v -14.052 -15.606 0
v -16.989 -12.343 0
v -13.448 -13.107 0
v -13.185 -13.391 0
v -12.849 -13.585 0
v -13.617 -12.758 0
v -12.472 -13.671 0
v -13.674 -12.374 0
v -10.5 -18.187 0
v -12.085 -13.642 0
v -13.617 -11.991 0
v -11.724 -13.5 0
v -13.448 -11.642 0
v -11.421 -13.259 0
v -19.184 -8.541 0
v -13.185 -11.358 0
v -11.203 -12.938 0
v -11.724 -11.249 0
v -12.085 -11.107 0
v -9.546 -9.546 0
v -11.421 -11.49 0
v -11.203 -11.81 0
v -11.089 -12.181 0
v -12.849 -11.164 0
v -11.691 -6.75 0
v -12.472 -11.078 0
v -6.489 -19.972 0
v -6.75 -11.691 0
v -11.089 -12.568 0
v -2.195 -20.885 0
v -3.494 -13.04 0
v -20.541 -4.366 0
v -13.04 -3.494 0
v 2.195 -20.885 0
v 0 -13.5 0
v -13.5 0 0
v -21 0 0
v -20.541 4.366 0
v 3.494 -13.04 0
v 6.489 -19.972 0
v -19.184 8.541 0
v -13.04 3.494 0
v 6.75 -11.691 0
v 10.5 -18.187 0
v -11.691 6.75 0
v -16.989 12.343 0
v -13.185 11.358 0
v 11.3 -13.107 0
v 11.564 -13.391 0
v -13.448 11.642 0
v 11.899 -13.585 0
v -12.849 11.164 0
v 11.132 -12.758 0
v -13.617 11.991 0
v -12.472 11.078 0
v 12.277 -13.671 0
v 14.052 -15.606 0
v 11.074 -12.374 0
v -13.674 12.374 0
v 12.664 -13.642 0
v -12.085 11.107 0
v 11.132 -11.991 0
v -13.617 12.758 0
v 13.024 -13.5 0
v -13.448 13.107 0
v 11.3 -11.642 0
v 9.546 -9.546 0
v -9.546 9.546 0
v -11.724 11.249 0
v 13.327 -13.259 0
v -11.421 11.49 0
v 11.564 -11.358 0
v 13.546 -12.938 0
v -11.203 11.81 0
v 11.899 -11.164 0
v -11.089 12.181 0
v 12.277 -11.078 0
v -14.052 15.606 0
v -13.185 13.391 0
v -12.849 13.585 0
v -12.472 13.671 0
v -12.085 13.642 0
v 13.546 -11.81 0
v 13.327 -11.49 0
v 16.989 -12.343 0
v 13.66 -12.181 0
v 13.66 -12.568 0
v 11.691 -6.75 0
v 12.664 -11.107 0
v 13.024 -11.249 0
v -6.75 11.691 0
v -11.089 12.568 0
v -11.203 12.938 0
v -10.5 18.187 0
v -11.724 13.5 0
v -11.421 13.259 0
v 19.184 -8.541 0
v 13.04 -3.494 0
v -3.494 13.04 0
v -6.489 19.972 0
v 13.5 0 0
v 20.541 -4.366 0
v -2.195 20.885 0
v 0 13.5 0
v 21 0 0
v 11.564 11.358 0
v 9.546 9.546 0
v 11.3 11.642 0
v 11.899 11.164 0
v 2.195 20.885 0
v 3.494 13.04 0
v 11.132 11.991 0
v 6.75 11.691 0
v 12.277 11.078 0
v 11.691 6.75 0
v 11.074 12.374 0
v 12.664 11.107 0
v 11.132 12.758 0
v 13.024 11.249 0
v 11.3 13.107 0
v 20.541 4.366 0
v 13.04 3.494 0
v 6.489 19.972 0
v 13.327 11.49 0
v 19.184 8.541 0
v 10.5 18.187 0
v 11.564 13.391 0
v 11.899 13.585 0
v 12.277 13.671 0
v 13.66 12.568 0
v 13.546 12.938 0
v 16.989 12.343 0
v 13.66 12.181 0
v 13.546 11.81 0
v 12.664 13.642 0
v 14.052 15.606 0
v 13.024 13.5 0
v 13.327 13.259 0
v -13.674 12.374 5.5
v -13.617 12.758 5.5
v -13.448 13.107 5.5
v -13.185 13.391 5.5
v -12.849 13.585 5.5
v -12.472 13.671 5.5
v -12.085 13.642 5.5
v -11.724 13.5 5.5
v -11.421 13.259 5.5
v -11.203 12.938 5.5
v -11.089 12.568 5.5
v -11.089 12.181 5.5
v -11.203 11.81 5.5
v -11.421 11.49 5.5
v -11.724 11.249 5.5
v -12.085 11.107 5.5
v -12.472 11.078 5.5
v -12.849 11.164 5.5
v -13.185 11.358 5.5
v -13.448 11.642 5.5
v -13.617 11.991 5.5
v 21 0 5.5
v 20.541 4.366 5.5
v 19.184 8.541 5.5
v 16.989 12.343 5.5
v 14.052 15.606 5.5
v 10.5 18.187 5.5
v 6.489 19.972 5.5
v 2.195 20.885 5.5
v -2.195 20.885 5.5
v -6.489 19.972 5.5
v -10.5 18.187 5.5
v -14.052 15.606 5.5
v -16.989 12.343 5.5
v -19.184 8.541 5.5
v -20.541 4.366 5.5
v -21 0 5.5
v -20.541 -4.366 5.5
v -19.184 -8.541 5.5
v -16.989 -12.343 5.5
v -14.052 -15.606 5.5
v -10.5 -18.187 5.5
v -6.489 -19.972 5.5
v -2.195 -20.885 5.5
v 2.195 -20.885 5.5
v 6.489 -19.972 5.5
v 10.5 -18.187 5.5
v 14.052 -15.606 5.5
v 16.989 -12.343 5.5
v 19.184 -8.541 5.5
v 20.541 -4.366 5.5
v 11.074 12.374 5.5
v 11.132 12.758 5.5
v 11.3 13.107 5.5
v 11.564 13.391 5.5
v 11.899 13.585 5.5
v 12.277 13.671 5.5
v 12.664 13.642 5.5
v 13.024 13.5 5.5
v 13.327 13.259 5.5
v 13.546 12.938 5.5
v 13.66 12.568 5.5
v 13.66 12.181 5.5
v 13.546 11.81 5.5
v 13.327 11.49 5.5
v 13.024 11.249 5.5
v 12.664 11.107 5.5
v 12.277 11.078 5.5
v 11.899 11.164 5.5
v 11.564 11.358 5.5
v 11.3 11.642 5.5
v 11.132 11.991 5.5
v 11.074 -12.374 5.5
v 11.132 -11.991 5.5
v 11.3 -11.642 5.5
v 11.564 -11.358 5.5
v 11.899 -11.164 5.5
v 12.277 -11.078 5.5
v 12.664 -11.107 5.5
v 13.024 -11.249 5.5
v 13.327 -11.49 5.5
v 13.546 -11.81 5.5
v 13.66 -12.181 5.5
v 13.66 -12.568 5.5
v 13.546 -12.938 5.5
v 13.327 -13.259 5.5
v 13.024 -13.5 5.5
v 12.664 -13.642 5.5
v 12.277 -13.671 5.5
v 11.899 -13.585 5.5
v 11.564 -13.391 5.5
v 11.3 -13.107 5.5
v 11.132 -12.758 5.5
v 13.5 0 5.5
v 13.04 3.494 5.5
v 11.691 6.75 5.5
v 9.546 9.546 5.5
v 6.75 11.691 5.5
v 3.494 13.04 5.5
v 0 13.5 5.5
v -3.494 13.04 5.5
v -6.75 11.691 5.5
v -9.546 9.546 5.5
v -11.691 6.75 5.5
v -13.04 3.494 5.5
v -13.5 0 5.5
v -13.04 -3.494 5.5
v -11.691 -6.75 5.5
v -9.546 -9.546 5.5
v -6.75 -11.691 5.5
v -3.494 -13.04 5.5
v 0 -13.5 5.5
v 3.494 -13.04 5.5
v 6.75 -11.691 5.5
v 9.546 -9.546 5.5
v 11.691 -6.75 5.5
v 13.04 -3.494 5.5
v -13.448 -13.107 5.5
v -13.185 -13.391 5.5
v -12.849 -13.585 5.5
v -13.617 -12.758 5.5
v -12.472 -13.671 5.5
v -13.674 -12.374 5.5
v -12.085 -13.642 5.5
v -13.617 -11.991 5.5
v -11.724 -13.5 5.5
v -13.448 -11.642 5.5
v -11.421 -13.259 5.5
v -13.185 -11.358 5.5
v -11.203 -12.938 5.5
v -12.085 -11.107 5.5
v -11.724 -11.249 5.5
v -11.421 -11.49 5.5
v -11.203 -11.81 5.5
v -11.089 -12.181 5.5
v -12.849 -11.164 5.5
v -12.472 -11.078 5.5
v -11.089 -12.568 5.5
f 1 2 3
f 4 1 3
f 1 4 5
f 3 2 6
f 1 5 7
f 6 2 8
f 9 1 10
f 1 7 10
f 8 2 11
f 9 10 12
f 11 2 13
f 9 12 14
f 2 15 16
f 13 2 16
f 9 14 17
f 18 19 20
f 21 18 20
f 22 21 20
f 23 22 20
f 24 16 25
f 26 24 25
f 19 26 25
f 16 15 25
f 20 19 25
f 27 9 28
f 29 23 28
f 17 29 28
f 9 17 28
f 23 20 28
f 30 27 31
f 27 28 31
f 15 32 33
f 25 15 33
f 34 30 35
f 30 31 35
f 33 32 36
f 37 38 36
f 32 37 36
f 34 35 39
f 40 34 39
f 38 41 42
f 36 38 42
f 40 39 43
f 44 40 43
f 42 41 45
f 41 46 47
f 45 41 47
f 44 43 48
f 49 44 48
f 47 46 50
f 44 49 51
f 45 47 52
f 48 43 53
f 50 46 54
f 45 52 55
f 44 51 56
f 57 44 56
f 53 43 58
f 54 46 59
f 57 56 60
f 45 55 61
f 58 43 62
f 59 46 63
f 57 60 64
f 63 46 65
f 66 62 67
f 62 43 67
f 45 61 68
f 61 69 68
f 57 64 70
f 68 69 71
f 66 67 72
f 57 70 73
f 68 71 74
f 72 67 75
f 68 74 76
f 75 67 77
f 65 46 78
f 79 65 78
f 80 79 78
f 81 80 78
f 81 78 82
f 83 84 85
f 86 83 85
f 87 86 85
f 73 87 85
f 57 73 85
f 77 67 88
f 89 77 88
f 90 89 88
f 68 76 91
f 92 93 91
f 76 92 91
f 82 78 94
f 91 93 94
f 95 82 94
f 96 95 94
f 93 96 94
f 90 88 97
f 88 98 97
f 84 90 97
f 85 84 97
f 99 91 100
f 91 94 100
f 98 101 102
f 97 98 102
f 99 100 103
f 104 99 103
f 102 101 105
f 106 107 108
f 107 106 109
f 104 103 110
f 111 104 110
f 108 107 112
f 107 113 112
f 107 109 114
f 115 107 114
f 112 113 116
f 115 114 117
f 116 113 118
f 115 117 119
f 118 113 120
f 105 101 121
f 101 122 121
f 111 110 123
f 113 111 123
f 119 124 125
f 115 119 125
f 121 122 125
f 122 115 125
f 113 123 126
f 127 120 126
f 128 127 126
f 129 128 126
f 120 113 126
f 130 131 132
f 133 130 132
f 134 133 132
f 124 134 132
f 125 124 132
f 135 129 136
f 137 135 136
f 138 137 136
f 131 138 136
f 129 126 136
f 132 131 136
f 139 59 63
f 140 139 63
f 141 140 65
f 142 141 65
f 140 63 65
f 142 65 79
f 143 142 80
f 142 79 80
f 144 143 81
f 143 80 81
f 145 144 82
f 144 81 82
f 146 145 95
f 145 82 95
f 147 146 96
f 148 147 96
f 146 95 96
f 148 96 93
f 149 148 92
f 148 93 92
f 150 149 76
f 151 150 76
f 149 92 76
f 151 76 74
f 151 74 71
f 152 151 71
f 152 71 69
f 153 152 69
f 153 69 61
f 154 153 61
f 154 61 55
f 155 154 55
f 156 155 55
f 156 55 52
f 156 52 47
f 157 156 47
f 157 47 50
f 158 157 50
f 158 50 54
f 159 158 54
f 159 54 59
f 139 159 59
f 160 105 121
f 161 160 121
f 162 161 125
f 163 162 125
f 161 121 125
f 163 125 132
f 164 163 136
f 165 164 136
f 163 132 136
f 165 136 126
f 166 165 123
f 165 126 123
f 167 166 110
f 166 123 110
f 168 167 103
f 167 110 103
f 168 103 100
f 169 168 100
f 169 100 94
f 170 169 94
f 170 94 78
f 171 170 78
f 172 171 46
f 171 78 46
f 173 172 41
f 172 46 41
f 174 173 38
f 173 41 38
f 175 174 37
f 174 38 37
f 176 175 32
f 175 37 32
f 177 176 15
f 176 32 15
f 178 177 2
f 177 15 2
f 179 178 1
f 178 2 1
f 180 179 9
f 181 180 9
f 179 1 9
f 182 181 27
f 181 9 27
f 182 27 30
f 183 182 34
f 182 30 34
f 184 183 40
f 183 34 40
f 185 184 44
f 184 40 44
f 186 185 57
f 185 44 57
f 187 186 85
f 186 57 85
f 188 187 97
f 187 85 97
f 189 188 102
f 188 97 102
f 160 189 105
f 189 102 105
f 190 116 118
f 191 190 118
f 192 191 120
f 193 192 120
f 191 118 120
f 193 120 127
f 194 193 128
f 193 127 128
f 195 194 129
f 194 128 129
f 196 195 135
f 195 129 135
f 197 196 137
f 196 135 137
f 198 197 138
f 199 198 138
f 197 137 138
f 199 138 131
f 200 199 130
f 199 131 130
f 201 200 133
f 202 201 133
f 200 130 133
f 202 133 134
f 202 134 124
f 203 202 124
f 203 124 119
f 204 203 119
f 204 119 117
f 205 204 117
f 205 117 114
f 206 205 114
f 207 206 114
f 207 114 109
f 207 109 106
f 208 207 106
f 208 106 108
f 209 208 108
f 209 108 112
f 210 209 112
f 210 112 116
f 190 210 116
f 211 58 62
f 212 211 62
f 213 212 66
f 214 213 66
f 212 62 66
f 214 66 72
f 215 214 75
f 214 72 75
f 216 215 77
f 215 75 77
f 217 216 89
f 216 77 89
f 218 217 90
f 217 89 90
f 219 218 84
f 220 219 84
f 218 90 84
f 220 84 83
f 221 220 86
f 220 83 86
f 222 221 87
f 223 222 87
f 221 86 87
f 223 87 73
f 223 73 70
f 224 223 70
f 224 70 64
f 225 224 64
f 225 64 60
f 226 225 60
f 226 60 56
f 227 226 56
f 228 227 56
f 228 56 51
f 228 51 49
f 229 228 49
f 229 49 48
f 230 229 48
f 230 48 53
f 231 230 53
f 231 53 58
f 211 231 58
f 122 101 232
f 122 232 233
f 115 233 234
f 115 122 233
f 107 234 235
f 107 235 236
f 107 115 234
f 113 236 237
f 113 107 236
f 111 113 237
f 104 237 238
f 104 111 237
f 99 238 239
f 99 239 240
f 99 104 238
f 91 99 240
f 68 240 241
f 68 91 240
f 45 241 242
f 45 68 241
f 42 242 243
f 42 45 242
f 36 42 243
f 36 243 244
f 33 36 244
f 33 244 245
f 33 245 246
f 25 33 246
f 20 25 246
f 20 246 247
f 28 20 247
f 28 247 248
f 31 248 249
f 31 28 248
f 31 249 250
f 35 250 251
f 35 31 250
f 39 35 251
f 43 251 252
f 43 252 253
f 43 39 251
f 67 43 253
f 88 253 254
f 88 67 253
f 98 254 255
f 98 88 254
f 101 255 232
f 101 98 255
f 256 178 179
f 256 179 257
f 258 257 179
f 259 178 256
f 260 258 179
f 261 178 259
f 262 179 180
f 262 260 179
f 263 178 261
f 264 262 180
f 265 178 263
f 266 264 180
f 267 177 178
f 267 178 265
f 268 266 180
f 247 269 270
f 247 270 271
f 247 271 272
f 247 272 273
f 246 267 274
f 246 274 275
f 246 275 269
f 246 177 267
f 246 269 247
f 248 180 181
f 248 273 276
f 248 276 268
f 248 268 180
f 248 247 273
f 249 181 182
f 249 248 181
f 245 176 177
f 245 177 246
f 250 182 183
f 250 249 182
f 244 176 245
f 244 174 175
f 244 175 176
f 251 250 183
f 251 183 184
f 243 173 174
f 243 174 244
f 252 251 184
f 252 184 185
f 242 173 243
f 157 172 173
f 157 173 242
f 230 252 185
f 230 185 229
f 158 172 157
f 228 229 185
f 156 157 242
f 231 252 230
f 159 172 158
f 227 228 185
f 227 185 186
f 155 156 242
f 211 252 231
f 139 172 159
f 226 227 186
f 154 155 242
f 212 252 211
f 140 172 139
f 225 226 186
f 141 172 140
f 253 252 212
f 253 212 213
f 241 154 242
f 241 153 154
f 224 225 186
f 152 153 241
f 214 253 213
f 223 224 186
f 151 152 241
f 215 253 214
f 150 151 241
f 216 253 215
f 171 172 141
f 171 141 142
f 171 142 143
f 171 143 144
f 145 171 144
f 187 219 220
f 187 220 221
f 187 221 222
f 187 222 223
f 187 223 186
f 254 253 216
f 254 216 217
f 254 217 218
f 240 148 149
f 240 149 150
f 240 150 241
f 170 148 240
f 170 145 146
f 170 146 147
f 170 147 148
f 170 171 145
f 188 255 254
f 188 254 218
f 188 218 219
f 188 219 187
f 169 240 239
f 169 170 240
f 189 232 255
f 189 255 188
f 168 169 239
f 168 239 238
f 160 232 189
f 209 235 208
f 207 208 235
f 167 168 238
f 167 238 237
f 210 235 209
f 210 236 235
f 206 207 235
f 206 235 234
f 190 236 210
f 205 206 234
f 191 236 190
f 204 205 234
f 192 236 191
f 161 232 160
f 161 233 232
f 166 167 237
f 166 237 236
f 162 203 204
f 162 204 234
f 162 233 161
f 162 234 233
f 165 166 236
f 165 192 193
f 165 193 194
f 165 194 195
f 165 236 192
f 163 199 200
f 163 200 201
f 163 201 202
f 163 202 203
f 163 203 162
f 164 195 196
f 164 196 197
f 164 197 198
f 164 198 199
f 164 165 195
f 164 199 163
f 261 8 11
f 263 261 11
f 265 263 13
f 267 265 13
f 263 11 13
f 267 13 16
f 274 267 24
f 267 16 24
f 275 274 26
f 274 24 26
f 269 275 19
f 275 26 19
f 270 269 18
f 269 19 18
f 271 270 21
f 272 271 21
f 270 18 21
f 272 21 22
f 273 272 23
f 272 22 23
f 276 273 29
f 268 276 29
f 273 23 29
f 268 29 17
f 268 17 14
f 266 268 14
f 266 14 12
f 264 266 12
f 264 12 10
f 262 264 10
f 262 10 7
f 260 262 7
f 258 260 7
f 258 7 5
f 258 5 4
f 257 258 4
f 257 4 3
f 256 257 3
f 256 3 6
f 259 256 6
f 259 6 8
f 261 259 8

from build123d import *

# Parameters (mm, degrees)
SKETCH_1_R          = 21
SKETCH_1_R_2        = 13.5
EXTRUDE_1_DEPTH     = 5.5
SKETCH_2_R          = 1.3
CUT_EXTRUDE_1_DEPTH = 8


with BuildPart() as part:
    # 草图1 → 凸台-拉伸1 (new body)
    with BuildSketch(Plane.XY):
        Circle(SKETCH_1_R)
        Circle(SKETCH_1_R_2, mode=Mode.SUBTRACT)
    extrude(amount=EXTRUDE_1_DEPTH)

    # 草图2 → 切除-拉伸1 (cut)
    with BuildSketch(Plane(origin=(0, 0, 0), x_dir=(-1, 0, 0), z_dir=(0, 0, -1))):
        with Locations((-12.374368671, 12.374368671)):
            Circle(SKETCH_2_R)
        with Locations((12.374368671, 12.374368671)):
            Circle(SKETCH_2_R)
        with Locations((12.374368671, -12.374368671)):
            Circle(SKETCH_2_R)
        with Locations((-12.374368671, -12.374368671)):
            Circle(SKETCH_2_R)
    extrude(amount=-CUT_EXTRUDE_1_DEPTH, mode=Mode.SUBTRACT)


solid = part.part
